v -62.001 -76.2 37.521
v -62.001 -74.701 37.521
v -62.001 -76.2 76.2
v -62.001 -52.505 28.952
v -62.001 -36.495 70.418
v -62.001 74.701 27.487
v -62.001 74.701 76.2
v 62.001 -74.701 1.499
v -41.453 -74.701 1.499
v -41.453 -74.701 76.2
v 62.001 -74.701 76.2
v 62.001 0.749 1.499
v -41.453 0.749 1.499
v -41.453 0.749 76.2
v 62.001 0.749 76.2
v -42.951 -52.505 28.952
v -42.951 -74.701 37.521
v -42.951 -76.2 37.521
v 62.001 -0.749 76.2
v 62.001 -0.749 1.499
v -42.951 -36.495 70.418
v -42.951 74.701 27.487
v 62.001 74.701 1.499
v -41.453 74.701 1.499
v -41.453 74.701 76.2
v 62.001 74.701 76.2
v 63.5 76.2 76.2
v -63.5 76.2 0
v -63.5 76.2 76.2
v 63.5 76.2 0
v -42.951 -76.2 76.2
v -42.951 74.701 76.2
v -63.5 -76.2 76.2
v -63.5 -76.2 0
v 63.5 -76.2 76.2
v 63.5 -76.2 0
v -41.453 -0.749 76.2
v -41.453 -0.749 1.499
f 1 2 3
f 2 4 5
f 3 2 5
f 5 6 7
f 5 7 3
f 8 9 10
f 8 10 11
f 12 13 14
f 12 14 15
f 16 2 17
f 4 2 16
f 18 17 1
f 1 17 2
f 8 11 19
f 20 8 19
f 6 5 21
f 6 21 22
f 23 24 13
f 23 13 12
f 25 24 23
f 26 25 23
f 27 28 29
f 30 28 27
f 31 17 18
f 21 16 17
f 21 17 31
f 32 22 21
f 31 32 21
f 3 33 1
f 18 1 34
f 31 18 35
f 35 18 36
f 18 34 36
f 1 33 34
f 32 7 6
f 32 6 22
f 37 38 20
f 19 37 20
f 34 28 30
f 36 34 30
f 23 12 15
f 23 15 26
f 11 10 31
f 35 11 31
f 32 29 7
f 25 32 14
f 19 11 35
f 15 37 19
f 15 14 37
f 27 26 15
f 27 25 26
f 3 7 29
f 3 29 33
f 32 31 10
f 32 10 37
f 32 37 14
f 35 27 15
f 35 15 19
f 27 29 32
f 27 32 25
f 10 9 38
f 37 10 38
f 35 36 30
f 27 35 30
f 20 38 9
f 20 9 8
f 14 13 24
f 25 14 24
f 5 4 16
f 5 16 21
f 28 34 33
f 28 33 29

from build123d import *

# Parameters (mm, degrees)
F0_W      = 127
F0_H      = 152.4
F1_DEPTH  = 76.2
F2_T      = -1.4986
F3_W      = 1.4986
F3_H      = 149.4028
F4_DEPTH  = 74.7014
F5_W      = 103.4542
F5_H      = 1.4986
F6_DEPTH  = 74.7014
F8_DEPTH  = 20.5486
F9_W      = 19.05
F9_H      = 38.6785856472
F10_DEPTH = 4.064


# Not quite as in the source:
# - an extrude ends at something that could not be found from the text; its depth is read off the source's solid


with BuildPart() as f1:
    # F0 (on Top) → F1 (new body)
    with BuildSketch(Plane.XY):
        Rectangle(F0_W, F0_H)
    extrude(amount=F1_DEPTH)

    # F2
    f2_openings = [f1.faces().sort_by_distance(p)[0] for p in [
        (0, 0, 76.2),
    ]]
    offset(amount=F2_T, openings=f2_openings)

    # F3 (on face) → F4 (join, through all)
    with BuildSketch(Plane.XY.offset(1.4986)):
        with Locations((-42.2021, 0)):
            Rectangle(F3_W, F3_H)
    extrude(amount=F4_DEPTH)

    # F5 (on face) → F6 (join, through all)
    with BuildSketch(Plane.XY.offset(1.4986)):
        with Locations((10.2743, 0)):
            Rectangle(F5_W, F5_H)
    extrude(amount=F6_DEPTH)

    # F7 (on face) → F8 (join, through all)
    with BuildSketch(Plane(origin=(-63.5, 0, 0), x_dir=(0, -1, 0), z_dir=(-1, 0, 0))):
        Polygon((76.2, 0), (76.2, 38.1), (52.5047014133, 28.9516217345), (36.4950394487, 70.4183942612), (-76.2, 26.9086302568), (-76.2, 0), align=None)
    extrude(amount=-F8_DEPTH)

    # F9 (on face) → F10 (cut)
    with BuildSketch(Plane(origin=(0, -74.7014, 0), x_dir=(-1, 0, 0), z_dir=(0, 1, 0))):
        with Locations((52.4764, 56.8607071764)):
            Rectangle(F9_W, F9_H)
    extrude(amount=-F10_DEPTH, mode=Mode.SUBTRACT)


solid = f1.part
